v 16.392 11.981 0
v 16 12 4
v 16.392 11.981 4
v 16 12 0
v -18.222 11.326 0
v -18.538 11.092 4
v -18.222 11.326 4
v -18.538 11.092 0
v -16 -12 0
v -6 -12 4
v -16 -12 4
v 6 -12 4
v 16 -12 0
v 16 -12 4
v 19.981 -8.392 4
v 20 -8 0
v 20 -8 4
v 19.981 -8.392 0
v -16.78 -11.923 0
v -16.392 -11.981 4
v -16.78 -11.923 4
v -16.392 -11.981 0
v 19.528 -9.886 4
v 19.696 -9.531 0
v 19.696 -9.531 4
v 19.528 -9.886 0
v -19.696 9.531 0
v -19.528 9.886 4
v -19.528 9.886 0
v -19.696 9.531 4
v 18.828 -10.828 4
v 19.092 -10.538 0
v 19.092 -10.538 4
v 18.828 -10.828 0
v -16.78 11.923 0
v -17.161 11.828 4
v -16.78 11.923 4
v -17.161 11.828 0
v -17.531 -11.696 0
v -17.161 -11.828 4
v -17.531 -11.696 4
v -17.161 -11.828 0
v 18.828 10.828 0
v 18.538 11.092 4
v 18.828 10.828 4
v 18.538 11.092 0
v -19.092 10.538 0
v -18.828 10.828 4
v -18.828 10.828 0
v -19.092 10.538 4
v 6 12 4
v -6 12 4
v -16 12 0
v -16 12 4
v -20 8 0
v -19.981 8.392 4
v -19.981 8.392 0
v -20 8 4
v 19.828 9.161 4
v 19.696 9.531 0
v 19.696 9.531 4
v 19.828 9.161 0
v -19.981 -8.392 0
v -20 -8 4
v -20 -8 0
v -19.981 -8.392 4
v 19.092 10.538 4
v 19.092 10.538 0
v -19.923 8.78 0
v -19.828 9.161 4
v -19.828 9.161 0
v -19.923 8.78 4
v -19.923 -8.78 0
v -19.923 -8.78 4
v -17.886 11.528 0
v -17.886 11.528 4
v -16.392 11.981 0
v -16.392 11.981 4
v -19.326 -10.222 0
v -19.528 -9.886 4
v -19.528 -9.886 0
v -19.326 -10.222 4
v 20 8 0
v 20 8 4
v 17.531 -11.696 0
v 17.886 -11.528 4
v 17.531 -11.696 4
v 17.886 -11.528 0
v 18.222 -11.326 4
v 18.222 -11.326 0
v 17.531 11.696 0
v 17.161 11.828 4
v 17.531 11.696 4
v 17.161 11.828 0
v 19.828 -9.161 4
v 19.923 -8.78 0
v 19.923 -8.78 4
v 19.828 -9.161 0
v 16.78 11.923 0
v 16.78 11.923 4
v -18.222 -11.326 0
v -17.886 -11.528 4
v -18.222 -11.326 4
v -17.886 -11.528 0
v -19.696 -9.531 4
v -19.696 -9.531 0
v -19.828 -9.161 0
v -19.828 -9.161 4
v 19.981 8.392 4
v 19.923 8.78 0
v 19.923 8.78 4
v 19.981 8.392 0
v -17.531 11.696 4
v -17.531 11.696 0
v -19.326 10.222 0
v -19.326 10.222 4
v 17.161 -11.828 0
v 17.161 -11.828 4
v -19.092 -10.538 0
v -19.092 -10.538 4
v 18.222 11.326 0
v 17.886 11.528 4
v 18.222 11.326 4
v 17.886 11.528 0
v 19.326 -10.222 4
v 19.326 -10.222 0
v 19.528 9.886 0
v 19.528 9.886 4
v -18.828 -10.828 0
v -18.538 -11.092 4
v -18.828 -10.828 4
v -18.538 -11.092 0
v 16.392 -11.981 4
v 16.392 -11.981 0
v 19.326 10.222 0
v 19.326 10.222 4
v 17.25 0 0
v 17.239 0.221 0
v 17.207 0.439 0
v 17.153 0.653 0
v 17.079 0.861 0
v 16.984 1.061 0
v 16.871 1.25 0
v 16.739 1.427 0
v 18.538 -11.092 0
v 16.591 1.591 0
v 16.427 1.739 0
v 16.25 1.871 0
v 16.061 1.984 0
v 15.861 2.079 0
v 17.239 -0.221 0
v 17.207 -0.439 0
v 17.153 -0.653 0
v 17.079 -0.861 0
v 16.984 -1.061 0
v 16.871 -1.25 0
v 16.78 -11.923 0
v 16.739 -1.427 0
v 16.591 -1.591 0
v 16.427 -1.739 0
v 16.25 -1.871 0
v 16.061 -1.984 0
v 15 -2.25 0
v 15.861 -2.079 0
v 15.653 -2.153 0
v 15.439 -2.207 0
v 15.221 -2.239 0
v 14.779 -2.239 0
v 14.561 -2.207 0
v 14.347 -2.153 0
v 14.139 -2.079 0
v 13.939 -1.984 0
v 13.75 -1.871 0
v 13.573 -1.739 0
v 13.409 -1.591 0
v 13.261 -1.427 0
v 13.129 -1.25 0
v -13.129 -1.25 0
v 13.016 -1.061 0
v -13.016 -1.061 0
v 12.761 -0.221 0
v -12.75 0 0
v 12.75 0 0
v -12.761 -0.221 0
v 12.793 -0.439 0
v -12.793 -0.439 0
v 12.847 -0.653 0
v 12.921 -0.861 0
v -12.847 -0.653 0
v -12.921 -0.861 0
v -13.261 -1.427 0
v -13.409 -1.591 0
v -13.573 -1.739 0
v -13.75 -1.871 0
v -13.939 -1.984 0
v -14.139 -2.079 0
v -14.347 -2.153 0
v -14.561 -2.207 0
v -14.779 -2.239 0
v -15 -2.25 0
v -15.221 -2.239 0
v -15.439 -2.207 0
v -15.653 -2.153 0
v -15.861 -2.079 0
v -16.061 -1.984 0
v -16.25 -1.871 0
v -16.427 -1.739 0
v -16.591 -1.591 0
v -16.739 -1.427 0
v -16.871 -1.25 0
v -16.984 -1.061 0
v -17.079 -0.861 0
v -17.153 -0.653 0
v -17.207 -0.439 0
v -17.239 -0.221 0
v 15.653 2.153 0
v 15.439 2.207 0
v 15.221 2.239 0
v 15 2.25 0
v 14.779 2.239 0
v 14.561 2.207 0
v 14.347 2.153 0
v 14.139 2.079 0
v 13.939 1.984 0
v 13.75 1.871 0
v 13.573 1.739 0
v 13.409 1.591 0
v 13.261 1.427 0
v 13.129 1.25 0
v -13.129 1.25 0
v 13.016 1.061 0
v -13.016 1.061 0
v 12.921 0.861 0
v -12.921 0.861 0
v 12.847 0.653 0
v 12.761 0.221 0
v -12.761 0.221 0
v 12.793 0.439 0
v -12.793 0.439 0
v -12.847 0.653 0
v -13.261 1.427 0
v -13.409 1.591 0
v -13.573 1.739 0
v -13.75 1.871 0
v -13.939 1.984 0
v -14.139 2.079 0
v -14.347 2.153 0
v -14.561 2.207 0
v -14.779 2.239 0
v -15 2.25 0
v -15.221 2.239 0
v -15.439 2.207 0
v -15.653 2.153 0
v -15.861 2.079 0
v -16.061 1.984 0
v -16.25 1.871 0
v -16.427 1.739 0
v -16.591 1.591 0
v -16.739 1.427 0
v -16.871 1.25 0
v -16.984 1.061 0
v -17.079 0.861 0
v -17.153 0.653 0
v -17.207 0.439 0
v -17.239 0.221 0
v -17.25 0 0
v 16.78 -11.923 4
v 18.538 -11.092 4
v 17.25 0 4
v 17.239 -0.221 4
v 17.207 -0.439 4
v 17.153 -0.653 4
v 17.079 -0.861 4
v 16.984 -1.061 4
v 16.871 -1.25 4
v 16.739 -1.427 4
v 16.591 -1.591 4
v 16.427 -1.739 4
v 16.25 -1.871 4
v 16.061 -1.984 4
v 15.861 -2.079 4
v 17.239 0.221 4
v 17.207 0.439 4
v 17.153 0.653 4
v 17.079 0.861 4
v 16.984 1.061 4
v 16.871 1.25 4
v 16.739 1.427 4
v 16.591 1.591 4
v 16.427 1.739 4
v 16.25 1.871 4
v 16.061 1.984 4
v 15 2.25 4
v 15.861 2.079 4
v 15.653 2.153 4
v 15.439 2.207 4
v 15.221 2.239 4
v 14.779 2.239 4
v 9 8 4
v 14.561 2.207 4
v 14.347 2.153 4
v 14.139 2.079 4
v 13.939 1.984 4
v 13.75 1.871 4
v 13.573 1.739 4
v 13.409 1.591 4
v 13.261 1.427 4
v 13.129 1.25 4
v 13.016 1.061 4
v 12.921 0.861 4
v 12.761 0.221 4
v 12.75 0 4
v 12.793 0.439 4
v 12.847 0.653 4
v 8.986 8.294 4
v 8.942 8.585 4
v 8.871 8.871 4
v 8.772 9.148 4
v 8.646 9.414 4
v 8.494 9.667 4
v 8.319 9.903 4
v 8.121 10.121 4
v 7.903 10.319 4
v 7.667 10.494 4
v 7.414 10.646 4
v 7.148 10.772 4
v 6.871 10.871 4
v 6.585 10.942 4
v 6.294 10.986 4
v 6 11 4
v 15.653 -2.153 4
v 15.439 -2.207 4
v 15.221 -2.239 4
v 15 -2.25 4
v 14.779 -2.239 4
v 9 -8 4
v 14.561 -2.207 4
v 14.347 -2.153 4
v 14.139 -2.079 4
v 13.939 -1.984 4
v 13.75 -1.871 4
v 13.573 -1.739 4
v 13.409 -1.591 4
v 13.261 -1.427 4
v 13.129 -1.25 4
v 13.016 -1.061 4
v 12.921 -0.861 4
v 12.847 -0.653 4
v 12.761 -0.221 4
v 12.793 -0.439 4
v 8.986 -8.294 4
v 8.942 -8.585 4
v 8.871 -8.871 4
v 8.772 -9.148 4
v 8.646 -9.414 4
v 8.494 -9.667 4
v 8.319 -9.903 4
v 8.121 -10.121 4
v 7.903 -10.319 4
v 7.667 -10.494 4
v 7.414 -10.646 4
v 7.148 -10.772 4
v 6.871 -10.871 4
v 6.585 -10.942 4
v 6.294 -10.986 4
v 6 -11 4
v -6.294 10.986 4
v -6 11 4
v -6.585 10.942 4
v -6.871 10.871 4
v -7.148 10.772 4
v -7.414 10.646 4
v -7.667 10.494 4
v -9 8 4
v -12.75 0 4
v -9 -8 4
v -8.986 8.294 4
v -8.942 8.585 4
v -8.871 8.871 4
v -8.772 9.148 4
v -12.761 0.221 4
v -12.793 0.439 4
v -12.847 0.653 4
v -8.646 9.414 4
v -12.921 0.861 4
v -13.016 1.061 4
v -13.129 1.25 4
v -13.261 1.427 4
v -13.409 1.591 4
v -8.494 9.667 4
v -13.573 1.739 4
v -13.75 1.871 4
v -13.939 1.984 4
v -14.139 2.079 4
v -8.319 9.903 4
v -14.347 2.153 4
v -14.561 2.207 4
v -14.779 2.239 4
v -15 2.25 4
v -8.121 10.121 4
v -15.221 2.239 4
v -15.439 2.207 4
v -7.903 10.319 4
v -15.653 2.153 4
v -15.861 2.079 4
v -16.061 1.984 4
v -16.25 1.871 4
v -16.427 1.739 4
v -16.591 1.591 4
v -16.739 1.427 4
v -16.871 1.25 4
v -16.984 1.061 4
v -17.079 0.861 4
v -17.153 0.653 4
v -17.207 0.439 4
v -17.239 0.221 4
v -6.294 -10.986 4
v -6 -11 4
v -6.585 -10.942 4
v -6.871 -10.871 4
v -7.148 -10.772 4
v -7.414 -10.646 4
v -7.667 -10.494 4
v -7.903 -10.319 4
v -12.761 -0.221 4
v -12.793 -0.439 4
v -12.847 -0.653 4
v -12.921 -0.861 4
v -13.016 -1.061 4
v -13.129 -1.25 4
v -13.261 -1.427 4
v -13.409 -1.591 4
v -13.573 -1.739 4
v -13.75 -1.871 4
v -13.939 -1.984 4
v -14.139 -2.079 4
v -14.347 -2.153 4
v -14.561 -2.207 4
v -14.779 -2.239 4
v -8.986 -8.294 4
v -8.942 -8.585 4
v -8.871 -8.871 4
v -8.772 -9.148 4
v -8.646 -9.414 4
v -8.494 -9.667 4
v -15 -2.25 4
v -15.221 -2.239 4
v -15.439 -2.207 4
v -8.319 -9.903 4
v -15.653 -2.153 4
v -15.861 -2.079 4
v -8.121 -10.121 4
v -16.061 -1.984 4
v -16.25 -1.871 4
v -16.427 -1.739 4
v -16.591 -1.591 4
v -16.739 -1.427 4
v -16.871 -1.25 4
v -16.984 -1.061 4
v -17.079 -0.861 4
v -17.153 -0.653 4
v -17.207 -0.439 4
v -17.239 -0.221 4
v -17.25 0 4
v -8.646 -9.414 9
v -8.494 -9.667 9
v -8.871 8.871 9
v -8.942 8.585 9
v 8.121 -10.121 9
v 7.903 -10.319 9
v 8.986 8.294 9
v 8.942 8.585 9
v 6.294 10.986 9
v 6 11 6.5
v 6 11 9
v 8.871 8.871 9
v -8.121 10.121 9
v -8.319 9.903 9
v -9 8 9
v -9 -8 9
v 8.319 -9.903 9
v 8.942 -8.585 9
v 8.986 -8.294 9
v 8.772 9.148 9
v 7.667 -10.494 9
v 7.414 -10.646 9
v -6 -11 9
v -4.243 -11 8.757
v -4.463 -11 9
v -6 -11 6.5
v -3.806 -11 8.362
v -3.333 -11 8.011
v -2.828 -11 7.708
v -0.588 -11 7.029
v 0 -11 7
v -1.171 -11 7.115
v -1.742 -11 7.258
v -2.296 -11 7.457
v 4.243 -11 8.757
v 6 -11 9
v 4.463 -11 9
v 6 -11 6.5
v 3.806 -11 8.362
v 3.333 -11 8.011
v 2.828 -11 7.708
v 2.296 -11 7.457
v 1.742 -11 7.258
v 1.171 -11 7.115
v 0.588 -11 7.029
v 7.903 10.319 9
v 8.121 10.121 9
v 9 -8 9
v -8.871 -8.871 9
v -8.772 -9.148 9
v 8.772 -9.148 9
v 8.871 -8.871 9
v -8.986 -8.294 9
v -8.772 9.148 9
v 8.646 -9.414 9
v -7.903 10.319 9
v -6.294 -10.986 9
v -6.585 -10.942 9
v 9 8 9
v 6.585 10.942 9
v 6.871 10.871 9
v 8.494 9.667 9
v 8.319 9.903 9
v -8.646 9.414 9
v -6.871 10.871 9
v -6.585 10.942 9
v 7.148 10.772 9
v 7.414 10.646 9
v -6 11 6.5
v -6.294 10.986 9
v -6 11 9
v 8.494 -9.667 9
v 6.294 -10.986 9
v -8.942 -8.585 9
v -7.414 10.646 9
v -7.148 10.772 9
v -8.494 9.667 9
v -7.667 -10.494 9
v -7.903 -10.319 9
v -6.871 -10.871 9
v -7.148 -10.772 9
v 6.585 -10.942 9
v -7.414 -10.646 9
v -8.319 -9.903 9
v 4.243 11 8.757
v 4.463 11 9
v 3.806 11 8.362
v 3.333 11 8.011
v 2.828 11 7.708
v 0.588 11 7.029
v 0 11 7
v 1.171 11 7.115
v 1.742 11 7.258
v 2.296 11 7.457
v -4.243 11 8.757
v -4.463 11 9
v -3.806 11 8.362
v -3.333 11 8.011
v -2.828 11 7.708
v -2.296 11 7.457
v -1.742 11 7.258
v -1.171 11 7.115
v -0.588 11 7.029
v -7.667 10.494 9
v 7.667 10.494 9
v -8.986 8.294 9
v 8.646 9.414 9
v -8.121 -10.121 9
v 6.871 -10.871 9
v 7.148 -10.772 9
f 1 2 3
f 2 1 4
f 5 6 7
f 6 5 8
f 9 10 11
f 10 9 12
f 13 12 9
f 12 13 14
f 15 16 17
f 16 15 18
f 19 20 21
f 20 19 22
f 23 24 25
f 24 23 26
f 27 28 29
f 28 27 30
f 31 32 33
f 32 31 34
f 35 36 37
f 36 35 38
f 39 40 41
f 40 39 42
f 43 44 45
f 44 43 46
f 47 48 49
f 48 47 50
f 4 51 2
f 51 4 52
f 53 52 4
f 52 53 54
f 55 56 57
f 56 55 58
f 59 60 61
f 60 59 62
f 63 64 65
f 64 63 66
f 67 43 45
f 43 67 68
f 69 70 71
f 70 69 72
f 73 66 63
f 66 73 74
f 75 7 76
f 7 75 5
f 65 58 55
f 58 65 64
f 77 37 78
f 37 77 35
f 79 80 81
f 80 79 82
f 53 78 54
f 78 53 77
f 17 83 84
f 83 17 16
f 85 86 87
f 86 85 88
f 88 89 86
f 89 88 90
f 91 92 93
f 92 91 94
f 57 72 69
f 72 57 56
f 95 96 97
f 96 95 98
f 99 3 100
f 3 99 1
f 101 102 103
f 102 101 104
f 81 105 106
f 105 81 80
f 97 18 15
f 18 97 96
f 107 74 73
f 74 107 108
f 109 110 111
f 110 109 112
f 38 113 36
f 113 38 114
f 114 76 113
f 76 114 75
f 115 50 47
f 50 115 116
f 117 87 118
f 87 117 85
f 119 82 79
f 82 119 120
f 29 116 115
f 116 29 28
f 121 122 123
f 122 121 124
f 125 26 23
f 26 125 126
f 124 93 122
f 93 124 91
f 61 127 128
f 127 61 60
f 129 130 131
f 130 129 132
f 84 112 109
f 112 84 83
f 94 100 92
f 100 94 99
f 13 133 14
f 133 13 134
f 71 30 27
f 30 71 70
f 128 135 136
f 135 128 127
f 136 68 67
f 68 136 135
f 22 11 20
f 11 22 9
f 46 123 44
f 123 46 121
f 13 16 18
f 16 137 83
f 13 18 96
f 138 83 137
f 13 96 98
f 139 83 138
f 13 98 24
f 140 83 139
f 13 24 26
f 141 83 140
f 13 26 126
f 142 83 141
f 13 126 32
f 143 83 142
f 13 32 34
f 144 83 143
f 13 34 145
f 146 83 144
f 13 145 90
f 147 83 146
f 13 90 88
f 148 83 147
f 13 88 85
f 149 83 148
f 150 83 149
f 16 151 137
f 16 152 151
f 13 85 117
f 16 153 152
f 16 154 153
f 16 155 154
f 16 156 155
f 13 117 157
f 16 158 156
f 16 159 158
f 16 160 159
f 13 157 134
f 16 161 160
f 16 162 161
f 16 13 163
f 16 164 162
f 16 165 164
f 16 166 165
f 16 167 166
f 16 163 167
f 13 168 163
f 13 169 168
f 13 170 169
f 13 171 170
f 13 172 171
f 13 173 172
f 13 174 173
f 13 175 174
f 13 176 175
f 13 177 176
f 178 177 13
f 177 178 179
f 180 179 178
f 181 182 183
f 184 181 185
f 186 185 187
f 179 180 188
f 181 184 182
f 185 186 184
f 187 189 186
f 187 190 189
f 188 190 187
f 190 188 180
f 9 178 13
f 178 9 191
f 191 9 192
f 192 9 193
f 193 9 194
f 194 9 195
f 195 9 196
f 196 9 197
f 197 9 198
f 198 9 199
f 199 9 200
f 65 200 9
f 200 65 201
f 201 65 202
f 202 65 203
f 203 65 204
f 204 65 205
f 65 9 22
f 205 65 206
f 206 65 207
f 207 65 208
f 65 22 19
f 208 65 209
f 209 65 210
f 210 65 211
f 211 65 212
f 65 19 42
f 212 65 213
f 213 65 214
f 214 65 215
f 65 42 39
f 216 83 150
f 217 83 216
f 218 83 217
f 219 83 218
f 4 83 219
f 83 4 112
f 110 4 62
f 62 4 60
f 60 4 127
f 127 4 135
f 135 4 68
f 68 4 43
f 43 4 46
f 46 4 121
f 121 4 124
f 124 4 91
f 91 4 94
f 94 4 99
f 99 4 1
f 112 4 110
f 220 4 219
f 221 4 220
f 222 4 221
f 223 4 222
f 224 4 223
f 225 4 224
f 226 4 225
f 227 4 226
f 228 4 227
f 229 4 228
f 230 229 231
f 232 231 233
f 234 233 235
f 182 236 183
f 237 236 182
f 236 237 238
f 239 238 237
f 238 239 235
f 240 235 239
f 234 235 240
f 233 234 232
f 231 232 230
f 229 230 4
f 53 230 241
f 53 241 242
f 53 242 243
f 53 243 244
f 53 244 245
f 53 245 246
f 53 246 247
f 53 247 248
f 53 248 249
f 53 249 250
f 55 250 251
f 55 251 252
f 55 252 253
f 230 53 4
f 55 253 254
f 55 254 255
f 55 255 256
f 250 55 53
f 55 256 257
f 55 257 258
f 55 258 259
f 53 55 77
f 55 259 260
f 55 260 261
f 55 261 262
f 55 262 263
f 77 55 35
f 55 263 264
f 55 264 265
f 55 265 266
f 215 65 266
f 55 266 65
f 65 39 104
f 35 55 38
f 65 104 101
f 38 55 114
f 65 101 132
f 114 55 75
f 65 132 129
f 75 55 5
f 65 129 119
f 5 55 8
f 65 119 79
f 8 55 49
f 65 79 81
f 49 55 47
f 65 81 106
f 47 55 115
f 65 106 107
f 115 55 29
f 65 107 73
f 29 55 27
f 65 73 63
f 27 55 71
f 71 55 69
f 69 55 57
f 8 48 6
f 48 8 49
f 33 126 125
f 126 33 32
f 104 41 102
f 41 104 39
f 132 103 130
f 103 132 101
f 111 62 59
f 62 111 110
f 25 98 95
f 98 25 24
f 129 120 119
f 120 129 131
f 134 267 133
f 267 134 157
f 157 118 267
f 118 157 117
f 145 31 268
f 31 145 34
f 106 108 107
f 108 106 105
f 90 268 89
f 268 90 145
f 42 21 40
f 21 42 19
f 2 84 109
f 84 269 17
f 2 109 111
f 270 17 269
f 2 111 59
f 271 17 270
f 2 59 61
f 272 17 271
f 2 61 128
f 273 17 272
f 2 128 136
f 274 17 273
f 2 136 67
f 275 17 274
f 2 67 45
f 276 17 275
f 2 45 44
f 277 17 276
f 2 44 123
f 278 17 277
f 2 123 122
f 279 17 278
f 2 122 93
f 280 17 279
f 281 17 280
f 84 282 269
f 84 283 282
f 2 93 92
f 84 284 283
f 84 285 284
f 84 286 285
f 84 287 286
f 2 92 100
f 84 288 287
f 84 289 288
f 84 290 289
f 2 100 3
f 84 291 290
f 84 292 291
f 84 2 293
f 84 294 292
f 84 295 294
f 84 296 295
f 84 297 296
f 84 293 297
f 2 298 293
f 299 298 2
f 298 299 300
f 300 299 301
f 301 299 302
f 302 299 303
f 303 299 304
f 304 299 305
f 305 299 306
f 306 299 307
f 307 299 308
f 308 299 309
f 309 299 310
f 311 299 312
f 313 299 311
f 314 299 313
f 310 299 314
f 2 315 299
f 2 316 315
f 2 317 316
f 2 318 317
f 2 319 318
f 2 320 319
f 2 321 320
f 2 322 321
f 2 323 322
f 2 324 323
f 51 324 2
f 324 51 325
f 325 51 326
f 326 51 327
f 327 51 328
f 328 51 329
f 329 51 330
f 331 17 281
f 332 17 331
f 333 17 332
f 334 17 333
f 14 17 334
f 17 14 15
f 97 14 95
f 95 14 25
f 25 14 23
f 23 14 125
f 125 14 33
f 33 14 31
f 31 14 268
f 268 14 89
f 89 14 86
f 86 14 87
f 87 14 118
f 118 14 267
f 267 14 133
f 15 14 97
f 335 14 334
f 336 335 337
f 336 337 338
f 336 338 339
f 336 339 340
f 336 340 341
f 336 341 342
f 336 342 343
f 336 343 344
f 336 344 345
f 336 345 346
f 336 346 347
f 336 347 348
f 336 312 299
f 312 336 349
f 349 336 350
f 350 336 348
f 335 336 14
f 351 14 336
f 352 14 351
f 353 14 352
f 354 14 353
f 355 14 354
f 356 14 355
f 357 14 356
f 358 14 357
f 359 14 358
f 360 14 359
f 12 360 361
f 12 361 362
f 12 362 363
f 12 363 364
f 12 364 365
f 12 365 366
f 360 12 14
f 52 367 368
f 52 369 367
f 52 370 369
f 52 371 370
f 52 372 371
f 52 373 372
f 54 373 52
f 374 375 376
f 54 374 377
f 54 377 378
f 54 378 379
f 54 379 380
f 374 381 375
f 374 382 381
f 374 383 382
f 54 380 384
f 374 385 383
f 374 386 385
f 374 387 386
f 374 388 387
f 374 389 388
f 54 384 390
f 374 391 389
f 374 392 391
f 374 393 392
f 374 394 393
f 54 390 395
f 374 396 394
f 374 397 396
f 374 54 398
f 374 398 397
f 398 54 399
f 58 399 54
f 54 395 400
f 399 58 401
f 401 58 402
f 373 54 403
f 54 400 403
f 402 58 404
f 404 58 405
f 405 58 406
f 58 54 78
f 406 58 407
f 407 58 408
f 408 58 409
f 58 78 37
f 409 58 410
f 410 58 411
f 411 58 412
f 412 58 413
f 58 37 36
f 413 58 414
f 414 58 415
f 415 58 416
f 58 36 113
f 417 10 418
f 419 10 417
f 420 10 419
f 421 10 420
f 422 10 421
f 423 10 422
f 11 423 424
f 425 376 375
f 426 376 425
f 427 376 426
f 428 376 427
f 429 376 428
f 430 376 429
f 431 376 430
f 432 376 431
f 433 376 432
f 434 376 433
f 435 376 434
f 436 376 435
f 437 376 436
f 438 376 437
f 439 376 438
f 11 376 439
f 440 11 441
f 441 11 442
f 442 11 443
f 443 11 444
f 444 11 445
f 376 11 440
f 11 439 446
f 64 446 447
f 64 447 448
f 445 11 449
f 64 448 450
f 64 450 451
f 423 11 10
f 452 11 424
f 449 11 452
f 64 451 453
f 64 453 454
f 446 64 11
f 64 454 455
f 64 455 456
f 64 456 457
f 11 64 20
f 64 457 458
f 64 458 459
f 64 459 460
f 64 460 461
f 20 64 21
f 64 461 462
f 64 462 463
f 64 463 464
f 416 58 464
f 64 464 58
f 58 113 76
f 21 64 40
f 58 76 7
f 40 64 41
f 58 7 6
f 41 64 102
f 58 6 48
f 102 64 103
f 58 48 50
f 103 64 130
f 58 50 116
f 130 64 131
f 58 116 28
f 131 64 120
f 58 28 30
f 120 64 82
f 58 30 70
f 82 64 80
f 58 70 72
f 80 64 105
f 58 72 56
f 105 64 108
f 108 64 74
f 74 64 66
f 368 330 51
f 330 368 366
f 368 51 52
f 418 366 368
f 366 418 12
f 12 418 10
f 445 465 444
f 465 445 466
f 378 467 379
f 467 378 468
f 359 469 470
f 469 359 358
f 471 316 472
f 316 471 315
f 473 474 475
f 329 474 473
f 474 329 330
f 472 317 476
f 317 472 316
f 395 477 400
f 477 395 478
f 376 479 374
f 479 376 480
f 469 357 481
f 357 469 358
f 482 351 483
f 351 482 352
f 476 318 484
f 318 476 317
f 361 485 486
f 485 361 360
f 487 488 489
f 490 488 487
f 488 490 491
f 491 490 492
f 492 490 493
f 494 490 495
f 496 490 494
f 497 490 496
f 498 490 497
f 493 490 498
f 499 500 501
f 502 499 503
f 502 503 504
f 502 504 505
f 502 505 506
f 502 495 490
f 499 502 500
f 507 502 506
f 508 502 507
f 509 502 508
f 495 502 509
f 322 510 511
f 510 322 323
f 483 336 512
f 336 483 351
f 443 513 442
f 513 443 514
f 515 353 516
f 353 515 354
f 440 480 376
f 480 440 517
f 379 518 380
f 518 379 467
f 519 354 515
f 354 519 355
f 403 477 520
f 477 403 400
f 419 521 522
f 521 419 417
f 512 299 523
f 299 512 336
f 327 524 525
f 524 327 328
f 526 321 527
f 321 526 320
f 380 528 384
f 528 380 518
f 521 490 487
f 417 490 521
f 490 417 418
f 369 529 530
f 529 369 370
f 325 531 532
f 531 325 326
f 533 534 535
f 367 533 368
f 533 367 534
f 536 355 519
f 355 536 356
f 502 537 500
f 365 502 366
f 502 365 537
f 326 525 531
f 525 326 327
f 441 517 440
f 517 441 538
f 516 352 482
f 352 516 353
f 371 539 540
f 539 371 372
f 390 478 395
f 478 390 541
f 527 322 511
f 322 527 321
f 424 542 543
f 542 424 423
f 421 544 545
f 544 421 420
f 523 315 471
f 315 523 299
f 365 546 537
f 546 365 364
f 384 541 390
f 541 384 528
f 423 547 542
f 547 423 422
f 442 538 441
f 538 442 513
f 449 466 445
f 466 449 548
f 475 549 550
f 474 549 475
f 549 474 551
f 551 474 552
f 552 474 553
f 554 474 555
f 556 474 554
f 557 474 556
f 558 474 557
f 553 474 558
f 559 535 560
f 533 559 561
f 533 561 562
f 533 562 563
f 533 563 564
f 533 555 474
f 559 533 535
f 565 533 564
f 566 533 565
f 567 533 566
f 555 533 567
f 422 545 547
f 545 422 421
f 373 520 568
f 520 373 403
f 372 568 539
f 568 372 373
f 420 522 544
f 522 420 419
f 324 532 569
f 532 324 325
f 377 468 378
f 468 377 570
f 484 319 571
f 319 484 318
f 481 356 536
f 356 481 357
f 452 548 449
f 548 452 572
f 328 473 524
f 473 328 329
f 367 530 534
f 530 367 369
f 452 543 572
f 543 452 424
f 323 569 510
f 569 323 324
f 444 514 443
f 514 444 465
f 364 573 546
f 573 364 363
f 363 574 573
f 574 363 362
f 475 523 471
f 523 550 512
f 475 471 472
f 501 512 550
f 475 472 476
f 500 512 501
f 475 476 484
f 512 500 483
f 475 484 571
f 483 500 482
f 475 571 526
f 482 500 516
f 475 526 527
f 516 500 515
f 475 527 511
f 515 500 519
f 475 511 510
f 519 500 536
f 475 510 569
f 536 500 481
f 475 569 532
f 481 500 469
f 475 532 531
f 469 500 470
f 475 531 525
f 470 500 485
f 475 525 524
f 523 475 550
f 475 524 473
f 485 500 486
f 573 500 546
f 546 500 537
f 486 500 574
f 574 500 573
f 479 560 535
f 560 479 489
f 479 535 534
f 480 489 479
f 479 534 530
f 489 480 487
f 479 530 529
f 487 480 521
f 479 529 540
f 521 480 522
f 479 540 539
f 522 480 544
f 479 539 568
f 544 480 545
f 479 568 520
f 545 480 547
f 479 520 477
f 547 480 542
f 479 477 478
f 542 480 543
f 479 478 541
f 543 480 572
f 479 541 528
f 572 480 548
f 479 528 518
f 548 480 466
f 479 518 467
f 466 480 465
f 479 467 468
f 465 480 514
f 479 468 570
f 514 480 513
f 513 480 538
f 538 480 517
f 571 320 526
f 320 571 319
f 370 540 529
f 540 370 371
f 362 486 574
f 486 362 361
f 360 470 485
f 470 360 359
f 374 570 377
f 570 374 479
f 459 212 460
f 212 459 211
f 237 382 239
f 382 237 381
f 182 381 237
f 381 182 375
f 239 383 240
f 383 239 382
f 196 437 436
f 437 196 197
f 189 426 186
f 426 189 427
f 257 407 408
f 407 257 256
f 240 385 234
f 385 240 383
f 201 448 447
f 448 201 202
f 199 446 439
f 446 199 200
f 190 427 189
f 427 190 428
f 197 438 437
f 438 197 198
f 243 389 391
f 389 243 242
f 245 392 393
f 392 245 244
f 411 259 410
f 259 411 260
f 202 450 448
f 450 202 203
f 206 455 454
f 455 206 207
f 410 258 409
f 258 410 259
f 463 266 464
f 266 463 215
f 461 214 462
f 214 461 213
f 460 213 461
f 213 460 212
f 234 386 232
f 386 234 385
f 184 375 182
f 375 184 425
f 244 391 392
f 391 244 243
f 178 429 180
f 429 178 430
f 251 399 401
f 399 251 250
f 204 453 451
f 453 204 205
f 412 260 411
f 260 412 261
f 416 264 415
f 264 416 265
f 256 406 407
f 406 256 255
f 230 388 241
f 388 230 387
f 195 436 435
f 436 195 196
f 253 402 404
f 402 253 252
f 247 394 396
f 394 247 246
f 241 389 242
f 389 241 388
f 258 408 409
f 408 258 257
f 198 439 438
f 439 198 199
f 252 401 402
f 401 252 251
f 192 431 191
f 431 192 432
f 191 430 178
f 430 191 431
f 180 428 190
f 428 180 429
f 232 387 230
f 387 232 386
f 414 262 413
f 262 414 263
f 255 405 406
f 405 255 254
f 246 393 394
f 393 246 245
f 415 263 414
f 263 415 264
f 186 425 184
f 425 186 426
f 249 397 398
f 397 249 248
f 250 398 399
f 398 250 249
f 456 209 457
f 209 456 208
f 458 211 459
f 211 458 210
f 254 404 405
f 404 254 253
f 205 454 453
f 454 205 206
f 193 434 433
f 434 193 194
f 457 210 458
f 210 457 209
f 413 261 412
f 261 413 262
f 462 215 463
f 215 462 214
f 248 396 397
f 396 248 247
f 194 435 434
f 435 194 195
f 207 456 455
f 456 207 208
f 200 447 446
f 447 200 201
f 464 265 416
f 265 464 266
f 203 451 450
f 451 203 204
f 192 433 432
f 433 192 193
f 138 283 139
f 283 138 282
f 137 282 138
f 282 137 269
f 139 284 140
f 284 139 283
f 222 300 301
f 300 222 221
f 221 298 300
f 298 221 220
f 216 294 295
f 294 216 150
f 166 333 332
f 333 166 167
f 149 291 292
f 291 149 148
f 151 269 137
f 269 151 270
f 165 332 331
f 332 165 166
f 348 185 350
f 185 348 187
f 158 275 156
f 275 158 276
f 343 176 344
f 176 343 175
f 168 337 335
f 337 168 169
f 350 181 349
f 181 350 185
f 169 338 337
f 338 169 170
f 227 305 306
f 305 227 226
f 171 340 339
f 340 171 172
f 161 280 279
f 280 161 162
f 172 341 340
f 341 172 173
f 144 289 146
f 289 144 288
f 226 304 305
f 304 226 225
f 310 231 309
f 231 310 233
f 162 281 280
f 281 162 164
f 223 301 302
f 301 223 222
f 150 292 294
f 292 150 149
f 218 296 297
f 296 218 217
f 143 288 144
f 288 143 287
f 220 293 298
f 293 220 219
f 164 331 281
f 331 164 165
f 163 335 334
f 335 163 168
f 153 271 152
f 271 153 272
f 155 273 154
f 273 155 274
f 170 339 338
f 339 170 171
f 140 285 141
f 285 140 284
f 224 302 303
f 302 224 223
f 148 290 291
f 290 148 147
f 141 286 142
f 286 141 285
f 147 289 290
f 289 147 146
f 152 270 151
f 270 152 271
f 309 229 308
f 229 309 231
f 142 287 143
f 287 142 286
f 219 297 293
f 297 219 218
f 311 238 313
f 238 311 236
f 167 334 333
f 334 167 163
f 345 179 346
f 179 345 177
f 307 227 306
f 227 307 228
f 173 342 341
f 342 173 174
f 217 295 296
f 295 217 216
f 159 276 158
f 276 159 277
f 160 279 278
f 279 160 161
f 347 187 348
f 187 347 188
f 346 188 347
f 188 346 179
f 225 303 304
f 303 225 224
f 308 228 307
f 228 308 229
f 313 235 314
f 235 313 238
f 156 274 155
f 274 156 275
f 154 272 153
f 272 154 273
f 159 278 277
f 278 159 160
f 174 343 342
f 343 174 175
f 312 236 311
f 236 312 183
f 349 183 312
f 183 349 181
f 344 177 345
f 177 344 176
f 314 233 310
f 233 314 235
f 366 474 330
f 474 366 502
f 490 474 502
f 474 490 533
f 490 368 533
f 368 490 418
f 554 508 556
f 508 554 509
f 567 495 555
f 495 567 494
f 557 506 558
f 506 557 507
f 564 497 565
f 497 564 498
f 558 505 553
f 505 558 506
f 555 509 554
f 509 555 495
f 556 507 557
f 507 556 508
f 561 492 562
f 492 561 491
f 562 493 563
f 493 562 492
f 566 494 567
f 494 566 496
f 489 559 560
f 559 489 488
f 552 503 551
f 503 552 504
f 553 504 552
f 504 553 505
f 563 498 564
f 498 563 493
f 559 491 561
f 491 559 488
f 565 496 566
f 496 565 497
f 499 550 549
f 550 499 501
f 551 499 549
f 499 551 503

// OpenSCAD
// file: common.scad
// Shared dimensions in mm; FDM fit allowances are design choices, not tolerances
// guaranteed by vendors. Exact mower model/serial and printer remain unknown.
// 76.2 x 38.1 rectangular rail is an UNVERIFIED selected envelope, not a
// specification for all TimeCutters (Toro also sells C-channel frames).
$fn = 64;
frame_rail_w = 76.2;                // depth wrapped by square U-bolt
frame_rail_h = 38.1;                // contact face width between U-bolt legs
frame_ubolt_inside_w = 40;
frame_ubolt_leg_nominal_d = 8;
frame_ubolt_center_pitch = frame_ubolt_inside_w + frame_ubolt_leg_nominal_d;
frame_ubolt_leg_hole_d = 9;
frame_ubolt_backing_t = 3;
frame_ubolt_washer_t = 2.4;
frame_ubolt_nut_h = 8;
frame_ubolt_thread_projection = 3;  // beyond full nut, not a second nut engagement
// Four-bolt printed steering-bar clamp. The 25.4 mm tube is only a coupon default;
// measure the actual lap-bar tube and tune its fit before printing working clamps.
clamp_tube_od_mm = 25.4;
clamp_tube_clearance_mm = 0.4;
clamp_shell_mm = 10;
clamp_bolt_x_mm = 18;
clamp_bolt_clear_mm = 5.5;          // four M5 clamp bolts
clamp_nut_af_mm = 8.2;
clamp_nut_depth_mm = 4.8;
clamp_pin_bore_mm = 6.6;
clamp_rod_eye_length_mm = 32;
clamp_rod_eye_width_mm = 20;
clamp_rod_eye_t_mm = 8;             // printed single-eye lug thickness
clamp_rod_gap_mm = 9;               // yoke clearance around the eye, nominally 0.5 mm per side
clamp_yoke_span_mm = 42;            // ear width clears the eye through its planar sweep
clamp_yoke_reach_mm = 42;           // total outboard yoke extension from the clamp body
clamp_yoke_root_overlap_mm = 4;     // fuse each printed ear into its half beyond the bar opening
clamp_yoke_sweep_clearance_mm = 1;
clamp_gauge_wall_mm = 5;
clamp_r_mm = (clamp_tube_od_mm + clamp_tube_clearance_mm) / 2;
clamp_half_h_mm = clamp_r_mm + clamp_shell_mm;
clamp_bolt_y_mm = clamp_r_mm + 7;
clamp_w_mm = 2 * (clamp_bolt_y_mm + clamp_shell_mm);
clamp_l_mm = 2 * (clamp_bolt_x_mm + 7);
clamp_gauge_index = 1;

function clamp_rod_eye_sweep_radius_mm() =
    sqrt(pow(clamp_rod_eye_length_mm/2, 2) + pow(clamp_rod_eye_width_mm/2, 2));

// Exact listing's RDS51150 stationary-holder SIDE drawing, not bottom holes.
// RDS51150 vs purchased RDS51150SG revision must be confirmed with the coupon.
servo_side_hole_pitch = 24;
servo_side_hole_clear_d = 2.9;       // M2.5 with 0.4 mm diametral allowance
servo_side_tool_bore_d = 6;
m3_clear = 3.4;
m4_clear = 4.5;
m5_clear = 5.5;
m6_clear = 6.4;
m8_clear = 8.4;
wall = 5;
clearance = 0.4;

function frame_ubolt_required_leg_length(saddle_t) =
    frame_rail_w + saddle_t + frame_ubolt_backing_t + frame_ubolt_washer_t +
    frame_ubolt_nut_h + frame_ubolt_thread_projection;
function saddle_width(pitch, bore) = pitch + bore + 2 * wall;


module slot(d, len, h) {
    hull() for (x = [-len / 2, len / 2]) translate([x, 0, 0]) cylinder(h = h, d = d);
}
module plate(l, w, t, r = 6) {
    assert(l >= 2 * r && w >= 2 * r && t > 0);
    hull() for (x = [-1, 1], y = [-1, 1])
        translate([x * (l / 2 - r), y * (w / 2 - r), 0]) cylinder(h = t, r = r);
}
module frame_saddle(l, t, span, leg = frame_ubolt_leg_hole_d) {
    assert(l / 2 - span / 2 - leg / 2 >= 5, "U-bolt hole too near saddle end");
    plate(l, saddle_width(frame_ubolt_center_pitch, leg), t, 8);
}
module frame_ubolt_slots(t, span, leg = frame_ubolt_leg_hole_d) {
    for (x = [-1, 1], y = [-1, 1])
        translate([x * span / 2, y * frame_ubolt_center_pitch / 2, -1]) cylinder(h = t + 2, d = leg);
}
// main file
// Outdoor accessory carriers, FDM ASA. These are strap/drill mounting interfaces,
// not asserted fits for unpublished sensor, antenna, fuse or relay housing SKUs.
// Never clamp a bare PCB, crush coax or obstruct an optical/RF aperture.
include <common.scad>
accessory_part = "harness_saddle";  // harness_saddle | equipment_saddle | antenna_deck
accessory_strap_w = 5.5;            // accommodates up to 4.8 mm wide ties
accessory_strap_t = 2.5;            // clear slot height; verify tie head routing
accessory_equipment_w = 36;         // flat housing support width, not a measured relay width
accessory_equipment_l = 55;
antenna_deck_size = 120;
antenna_metal_size = 100;           // OPTIONAL free-design metal ground plane; RF suitability unverified

module accessory_harness_saddle() {
    difference() {
        union() {
            plate(40, 24, 4, 4);
            translate([0, 0, 3.9]) plate(18, 22, 5.1, 3);
        }
        for (x = [-15, 15]) translate([x, 0, -1]) cylinder(d = m4_clear, h = 6);
        // Raised transverse tunnel lets a tie pass under an installed cable.
        translate([-6, -13, 4]) cube([12, 26, accessory_strap_t]);
        // Shallow cable seat only locates; the external tie supplies retention.
        translate([0, -13, 13]) rotate([-90, 0, 0]) cylinder(d = 12, h = 26);
    }
}

module accessory_equipment_saddle() {
    difference() {
        union() {
            plate(accessory_equipment_l + 22, accessory_equipment_w + 12, 4, 4);
            translate([0, 0, 3.9])
                plate(accessory_equipment_l, accessory_equipment_w, 5.1, 3);
        }
        for (x = [-1, 1])
            translate([x * (accessory_equipment_l / 2 + 6), 0, -1])
                rotate([0, 0, 90]) slot(m4_clear, 18, 6);
        // Two independent ties retain a sealed relay body or inline fuse holder.
        for (x = [-accessory_equipment_l / 4, accessory_equipment_l / 4])
            translate([x - accessory_strap_w / 2, -accessory_equipment_w / 2 - 8, 4])
                cube([accessory_strap_w, accessory_equipment_w + 16, accessory_strap_t]);
    }
}

module accessory_antenna_deck() {
    assert(antenna_deck_size >= antenna_metal_size + 20,
           "Leave attachment and tie access outside any metal ground plane");
    difference() {
        plate(antenna_deck_size, antenna_deck_size, 4, 6);
        for (x = [-1, 1], y = [-1, 1])
            translate([x * (antenna_deck_size / 2 - 7), y * (antenna_deck_size / 2 - 7), -1])
                cylinder(d = m4_clear, h = 6);
        // Four edge slots: hold the housing/metal plate, leave the sky aperture clear.
        for (a = [0, 90, 180, 270]) rotate([0, 0, a])
            translate([0, antenna_deck_size / 2 - 6, -1])
                slot(accessory_strap_w, 22, 6);
    }
}

if (accessory_part == "harness_saddle") accessory_harness_saddle();
else if (accessory_part == "equipment_saddle") accessory_equipment_saddle();
else if (accessory_part == "antenna_deck") accessory_antenna_deck();
else assert(false, "Unknown accessory_part");
